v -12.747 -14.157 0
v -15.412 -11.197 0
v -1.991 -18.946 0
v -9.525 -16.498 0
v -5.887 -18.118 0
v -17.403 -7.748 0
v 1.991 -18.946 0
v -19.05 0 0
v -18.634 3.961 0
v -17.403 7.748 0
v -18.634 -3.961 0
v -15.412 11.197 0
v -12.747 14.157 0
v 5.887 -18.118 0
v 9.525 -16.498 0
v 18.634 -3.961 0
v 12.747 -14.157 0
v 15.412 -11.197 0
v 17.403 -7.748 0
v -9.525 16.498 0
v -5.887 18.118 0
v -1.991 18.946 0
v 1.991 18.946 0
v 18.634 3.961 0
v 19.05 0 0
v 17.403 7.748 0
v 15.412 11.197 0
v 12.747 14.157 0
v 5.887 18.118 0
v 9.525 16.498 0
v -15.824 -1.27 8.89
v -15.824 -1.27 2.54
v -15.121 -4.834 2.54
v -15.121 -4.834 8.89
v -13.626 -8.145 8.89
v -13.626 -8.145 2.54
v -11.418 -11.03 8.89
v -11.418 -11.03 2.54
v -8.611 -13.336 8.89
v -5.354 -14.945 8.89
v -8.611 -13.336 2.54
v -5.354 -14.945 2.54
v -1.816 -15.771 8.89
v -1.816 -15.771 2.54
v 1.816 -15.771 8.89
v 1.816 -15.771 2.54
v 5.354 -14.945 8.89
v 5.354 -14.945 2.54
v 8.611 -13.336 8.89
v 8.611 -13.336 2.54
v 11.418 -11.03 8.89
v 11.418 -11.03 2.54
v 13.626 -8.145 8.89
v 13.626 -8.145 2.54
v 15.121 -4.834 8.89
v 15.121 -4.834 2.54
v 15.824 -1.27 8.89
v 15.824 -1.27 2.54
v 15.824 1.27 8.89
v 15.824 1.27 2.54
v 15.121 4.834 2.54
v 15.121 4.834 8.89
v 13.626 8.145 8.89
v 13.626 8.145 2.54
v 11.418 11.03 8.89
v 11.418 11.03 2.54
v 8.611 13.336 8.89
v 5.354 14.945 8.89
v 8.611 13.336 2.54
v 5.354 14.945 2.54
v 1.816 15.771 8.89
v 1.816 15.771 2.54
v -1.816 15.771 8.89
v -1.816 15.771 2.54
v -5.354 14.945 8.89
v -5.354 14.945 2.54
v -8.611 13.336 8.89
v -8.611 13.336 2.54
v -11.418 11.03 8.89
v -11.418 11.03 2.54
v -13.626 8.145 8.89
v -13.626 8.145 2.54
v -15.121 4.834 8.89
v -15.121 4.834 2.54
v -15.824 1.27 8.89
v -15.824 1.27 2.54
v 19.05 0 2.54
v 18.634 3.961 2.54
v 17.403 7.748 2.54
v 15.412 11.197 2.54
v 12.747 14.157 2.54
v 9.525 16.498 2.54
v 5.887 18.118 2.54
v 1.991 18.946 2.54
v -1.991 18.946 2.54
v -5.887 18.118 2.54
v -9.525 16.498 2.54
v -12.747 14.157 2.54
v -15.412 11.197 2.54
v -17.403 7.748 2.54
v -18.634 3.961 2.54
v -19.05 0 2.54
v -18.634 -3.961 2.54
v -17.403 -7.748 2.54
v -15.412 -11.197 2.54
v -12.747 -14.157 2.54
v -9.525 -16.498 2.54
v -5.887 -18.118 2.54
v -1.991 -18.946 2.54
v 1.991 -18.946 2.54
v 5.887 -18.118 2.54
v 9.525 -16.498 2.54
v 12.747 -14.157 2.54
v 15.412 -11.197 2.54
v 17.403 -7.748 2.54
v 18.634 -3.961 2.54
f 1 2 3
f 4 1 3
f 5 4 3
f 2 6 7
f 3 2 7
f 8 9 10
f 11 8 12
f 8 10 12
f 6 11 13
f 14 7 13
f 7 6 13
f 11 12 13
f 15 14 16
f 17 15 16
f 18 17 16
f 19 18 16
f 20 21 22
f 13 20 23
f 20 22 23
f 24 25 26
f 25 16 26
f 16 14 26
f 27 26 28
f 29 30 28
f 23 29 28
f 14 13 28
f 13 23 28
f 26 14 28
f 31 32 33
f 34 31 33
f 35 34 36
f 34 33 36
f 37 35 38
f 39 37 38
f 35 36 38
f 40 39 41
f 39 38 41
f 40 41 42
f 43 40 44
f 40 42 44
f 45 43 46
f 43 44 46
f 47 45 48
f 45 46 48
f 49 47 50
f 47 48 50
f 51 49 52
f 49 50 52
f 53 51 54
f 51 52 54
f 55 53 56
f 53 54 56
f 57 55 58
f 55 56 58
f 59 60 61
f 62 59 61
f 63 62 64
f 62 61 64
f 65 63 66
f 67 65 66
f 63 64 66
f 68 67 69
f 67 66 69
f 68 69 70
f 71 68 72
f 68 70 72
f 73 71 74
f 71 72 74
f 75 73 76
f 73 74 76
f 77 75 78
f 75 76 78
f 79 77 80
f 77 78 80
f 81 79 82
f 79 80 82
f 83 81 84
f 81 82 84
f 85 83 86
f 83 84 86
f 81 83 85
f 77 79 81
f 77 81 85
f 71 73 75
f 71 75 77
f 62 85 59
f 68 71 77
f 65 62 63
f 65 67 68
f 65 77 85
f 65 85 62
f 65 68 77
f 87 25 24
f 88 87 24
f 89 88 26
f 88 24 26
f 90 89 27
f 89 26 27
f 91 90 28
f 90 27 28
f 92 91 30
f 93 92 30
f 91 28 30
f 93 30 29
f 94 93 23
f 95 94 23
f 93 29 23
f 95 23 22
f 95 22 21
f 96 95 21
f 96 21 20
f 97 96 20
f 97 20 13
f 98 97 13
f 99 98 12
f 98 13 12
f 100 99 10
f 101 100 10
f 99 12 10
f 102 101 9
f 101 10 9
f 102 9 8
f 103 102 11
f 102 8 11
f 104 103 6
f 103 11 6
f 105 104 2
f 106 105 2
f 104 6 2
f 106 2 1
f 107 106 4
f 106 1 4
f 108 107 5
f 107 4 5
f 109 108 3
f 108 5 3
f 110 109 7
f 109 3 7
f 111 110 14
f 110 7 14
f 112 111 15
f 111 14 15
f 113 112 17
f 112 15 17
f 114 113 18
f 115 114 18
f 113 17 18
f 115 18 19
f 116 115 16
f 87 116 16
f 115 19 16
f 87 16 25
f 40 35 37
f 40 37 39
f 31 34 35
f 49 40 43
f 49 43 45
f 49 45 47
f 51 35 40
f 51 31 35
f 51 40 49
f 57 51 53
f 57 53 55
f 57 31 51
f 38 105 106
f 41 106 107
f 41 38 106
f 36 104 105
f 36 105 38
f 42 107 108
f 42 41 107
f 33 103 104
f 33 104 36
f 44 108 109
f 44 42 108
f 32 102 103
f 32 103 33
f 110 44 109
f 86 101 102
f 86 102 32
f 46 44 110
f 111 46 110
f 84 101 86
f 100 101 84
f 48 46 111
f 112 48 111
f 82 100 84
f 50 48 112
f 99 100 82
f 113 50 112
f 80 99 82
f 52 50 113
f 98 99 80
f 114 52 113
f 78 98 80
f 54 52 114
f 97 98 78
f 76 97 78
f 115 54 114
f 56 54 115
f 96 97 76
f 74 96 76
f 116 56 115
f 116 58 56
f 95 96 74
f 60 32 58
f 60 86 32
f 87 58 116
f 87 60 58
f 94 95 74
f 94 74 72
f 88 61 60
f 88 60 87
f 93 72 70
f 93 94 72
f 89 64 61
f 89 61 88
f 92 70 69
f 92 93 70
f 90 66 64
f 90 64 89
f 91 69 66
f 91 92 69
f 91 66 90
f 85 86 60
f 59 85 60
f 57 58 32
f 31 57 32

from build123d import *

# Parameters (mm, degrees)
F0_R     = 19.05
F1_DEPTH = 2.54
F3_DEPTH = 6.35


with BuildPart() as f1:
    # F0 (on Top) → F1 (new body)
    with BuildSketch(Plane.XY):
        Circle(F0_R)
    extrude(amount=F1_DEPTH)

    # F2 (on face) → F3 (join)
    with BuildSketch(Plane.XY.offset(2.54)):
        with BuildLine():
            Line((15.824118, -1.27), (-15.824118, -1.27))
            ThreePointArc((-15.824118, -1.27), (0, -15.875), (15.824118, -1.27))
        make_face()
        with BuildLine():
            Line((-15.824118, 1.27), (15.824118, 1.27))
            ThreePointArc((15.824118, 1.27), (0, 15.875), (-15.824118, 1.27))
        make_face()
    extrude(amount=F3_DEPTH)


solid = f1.part
